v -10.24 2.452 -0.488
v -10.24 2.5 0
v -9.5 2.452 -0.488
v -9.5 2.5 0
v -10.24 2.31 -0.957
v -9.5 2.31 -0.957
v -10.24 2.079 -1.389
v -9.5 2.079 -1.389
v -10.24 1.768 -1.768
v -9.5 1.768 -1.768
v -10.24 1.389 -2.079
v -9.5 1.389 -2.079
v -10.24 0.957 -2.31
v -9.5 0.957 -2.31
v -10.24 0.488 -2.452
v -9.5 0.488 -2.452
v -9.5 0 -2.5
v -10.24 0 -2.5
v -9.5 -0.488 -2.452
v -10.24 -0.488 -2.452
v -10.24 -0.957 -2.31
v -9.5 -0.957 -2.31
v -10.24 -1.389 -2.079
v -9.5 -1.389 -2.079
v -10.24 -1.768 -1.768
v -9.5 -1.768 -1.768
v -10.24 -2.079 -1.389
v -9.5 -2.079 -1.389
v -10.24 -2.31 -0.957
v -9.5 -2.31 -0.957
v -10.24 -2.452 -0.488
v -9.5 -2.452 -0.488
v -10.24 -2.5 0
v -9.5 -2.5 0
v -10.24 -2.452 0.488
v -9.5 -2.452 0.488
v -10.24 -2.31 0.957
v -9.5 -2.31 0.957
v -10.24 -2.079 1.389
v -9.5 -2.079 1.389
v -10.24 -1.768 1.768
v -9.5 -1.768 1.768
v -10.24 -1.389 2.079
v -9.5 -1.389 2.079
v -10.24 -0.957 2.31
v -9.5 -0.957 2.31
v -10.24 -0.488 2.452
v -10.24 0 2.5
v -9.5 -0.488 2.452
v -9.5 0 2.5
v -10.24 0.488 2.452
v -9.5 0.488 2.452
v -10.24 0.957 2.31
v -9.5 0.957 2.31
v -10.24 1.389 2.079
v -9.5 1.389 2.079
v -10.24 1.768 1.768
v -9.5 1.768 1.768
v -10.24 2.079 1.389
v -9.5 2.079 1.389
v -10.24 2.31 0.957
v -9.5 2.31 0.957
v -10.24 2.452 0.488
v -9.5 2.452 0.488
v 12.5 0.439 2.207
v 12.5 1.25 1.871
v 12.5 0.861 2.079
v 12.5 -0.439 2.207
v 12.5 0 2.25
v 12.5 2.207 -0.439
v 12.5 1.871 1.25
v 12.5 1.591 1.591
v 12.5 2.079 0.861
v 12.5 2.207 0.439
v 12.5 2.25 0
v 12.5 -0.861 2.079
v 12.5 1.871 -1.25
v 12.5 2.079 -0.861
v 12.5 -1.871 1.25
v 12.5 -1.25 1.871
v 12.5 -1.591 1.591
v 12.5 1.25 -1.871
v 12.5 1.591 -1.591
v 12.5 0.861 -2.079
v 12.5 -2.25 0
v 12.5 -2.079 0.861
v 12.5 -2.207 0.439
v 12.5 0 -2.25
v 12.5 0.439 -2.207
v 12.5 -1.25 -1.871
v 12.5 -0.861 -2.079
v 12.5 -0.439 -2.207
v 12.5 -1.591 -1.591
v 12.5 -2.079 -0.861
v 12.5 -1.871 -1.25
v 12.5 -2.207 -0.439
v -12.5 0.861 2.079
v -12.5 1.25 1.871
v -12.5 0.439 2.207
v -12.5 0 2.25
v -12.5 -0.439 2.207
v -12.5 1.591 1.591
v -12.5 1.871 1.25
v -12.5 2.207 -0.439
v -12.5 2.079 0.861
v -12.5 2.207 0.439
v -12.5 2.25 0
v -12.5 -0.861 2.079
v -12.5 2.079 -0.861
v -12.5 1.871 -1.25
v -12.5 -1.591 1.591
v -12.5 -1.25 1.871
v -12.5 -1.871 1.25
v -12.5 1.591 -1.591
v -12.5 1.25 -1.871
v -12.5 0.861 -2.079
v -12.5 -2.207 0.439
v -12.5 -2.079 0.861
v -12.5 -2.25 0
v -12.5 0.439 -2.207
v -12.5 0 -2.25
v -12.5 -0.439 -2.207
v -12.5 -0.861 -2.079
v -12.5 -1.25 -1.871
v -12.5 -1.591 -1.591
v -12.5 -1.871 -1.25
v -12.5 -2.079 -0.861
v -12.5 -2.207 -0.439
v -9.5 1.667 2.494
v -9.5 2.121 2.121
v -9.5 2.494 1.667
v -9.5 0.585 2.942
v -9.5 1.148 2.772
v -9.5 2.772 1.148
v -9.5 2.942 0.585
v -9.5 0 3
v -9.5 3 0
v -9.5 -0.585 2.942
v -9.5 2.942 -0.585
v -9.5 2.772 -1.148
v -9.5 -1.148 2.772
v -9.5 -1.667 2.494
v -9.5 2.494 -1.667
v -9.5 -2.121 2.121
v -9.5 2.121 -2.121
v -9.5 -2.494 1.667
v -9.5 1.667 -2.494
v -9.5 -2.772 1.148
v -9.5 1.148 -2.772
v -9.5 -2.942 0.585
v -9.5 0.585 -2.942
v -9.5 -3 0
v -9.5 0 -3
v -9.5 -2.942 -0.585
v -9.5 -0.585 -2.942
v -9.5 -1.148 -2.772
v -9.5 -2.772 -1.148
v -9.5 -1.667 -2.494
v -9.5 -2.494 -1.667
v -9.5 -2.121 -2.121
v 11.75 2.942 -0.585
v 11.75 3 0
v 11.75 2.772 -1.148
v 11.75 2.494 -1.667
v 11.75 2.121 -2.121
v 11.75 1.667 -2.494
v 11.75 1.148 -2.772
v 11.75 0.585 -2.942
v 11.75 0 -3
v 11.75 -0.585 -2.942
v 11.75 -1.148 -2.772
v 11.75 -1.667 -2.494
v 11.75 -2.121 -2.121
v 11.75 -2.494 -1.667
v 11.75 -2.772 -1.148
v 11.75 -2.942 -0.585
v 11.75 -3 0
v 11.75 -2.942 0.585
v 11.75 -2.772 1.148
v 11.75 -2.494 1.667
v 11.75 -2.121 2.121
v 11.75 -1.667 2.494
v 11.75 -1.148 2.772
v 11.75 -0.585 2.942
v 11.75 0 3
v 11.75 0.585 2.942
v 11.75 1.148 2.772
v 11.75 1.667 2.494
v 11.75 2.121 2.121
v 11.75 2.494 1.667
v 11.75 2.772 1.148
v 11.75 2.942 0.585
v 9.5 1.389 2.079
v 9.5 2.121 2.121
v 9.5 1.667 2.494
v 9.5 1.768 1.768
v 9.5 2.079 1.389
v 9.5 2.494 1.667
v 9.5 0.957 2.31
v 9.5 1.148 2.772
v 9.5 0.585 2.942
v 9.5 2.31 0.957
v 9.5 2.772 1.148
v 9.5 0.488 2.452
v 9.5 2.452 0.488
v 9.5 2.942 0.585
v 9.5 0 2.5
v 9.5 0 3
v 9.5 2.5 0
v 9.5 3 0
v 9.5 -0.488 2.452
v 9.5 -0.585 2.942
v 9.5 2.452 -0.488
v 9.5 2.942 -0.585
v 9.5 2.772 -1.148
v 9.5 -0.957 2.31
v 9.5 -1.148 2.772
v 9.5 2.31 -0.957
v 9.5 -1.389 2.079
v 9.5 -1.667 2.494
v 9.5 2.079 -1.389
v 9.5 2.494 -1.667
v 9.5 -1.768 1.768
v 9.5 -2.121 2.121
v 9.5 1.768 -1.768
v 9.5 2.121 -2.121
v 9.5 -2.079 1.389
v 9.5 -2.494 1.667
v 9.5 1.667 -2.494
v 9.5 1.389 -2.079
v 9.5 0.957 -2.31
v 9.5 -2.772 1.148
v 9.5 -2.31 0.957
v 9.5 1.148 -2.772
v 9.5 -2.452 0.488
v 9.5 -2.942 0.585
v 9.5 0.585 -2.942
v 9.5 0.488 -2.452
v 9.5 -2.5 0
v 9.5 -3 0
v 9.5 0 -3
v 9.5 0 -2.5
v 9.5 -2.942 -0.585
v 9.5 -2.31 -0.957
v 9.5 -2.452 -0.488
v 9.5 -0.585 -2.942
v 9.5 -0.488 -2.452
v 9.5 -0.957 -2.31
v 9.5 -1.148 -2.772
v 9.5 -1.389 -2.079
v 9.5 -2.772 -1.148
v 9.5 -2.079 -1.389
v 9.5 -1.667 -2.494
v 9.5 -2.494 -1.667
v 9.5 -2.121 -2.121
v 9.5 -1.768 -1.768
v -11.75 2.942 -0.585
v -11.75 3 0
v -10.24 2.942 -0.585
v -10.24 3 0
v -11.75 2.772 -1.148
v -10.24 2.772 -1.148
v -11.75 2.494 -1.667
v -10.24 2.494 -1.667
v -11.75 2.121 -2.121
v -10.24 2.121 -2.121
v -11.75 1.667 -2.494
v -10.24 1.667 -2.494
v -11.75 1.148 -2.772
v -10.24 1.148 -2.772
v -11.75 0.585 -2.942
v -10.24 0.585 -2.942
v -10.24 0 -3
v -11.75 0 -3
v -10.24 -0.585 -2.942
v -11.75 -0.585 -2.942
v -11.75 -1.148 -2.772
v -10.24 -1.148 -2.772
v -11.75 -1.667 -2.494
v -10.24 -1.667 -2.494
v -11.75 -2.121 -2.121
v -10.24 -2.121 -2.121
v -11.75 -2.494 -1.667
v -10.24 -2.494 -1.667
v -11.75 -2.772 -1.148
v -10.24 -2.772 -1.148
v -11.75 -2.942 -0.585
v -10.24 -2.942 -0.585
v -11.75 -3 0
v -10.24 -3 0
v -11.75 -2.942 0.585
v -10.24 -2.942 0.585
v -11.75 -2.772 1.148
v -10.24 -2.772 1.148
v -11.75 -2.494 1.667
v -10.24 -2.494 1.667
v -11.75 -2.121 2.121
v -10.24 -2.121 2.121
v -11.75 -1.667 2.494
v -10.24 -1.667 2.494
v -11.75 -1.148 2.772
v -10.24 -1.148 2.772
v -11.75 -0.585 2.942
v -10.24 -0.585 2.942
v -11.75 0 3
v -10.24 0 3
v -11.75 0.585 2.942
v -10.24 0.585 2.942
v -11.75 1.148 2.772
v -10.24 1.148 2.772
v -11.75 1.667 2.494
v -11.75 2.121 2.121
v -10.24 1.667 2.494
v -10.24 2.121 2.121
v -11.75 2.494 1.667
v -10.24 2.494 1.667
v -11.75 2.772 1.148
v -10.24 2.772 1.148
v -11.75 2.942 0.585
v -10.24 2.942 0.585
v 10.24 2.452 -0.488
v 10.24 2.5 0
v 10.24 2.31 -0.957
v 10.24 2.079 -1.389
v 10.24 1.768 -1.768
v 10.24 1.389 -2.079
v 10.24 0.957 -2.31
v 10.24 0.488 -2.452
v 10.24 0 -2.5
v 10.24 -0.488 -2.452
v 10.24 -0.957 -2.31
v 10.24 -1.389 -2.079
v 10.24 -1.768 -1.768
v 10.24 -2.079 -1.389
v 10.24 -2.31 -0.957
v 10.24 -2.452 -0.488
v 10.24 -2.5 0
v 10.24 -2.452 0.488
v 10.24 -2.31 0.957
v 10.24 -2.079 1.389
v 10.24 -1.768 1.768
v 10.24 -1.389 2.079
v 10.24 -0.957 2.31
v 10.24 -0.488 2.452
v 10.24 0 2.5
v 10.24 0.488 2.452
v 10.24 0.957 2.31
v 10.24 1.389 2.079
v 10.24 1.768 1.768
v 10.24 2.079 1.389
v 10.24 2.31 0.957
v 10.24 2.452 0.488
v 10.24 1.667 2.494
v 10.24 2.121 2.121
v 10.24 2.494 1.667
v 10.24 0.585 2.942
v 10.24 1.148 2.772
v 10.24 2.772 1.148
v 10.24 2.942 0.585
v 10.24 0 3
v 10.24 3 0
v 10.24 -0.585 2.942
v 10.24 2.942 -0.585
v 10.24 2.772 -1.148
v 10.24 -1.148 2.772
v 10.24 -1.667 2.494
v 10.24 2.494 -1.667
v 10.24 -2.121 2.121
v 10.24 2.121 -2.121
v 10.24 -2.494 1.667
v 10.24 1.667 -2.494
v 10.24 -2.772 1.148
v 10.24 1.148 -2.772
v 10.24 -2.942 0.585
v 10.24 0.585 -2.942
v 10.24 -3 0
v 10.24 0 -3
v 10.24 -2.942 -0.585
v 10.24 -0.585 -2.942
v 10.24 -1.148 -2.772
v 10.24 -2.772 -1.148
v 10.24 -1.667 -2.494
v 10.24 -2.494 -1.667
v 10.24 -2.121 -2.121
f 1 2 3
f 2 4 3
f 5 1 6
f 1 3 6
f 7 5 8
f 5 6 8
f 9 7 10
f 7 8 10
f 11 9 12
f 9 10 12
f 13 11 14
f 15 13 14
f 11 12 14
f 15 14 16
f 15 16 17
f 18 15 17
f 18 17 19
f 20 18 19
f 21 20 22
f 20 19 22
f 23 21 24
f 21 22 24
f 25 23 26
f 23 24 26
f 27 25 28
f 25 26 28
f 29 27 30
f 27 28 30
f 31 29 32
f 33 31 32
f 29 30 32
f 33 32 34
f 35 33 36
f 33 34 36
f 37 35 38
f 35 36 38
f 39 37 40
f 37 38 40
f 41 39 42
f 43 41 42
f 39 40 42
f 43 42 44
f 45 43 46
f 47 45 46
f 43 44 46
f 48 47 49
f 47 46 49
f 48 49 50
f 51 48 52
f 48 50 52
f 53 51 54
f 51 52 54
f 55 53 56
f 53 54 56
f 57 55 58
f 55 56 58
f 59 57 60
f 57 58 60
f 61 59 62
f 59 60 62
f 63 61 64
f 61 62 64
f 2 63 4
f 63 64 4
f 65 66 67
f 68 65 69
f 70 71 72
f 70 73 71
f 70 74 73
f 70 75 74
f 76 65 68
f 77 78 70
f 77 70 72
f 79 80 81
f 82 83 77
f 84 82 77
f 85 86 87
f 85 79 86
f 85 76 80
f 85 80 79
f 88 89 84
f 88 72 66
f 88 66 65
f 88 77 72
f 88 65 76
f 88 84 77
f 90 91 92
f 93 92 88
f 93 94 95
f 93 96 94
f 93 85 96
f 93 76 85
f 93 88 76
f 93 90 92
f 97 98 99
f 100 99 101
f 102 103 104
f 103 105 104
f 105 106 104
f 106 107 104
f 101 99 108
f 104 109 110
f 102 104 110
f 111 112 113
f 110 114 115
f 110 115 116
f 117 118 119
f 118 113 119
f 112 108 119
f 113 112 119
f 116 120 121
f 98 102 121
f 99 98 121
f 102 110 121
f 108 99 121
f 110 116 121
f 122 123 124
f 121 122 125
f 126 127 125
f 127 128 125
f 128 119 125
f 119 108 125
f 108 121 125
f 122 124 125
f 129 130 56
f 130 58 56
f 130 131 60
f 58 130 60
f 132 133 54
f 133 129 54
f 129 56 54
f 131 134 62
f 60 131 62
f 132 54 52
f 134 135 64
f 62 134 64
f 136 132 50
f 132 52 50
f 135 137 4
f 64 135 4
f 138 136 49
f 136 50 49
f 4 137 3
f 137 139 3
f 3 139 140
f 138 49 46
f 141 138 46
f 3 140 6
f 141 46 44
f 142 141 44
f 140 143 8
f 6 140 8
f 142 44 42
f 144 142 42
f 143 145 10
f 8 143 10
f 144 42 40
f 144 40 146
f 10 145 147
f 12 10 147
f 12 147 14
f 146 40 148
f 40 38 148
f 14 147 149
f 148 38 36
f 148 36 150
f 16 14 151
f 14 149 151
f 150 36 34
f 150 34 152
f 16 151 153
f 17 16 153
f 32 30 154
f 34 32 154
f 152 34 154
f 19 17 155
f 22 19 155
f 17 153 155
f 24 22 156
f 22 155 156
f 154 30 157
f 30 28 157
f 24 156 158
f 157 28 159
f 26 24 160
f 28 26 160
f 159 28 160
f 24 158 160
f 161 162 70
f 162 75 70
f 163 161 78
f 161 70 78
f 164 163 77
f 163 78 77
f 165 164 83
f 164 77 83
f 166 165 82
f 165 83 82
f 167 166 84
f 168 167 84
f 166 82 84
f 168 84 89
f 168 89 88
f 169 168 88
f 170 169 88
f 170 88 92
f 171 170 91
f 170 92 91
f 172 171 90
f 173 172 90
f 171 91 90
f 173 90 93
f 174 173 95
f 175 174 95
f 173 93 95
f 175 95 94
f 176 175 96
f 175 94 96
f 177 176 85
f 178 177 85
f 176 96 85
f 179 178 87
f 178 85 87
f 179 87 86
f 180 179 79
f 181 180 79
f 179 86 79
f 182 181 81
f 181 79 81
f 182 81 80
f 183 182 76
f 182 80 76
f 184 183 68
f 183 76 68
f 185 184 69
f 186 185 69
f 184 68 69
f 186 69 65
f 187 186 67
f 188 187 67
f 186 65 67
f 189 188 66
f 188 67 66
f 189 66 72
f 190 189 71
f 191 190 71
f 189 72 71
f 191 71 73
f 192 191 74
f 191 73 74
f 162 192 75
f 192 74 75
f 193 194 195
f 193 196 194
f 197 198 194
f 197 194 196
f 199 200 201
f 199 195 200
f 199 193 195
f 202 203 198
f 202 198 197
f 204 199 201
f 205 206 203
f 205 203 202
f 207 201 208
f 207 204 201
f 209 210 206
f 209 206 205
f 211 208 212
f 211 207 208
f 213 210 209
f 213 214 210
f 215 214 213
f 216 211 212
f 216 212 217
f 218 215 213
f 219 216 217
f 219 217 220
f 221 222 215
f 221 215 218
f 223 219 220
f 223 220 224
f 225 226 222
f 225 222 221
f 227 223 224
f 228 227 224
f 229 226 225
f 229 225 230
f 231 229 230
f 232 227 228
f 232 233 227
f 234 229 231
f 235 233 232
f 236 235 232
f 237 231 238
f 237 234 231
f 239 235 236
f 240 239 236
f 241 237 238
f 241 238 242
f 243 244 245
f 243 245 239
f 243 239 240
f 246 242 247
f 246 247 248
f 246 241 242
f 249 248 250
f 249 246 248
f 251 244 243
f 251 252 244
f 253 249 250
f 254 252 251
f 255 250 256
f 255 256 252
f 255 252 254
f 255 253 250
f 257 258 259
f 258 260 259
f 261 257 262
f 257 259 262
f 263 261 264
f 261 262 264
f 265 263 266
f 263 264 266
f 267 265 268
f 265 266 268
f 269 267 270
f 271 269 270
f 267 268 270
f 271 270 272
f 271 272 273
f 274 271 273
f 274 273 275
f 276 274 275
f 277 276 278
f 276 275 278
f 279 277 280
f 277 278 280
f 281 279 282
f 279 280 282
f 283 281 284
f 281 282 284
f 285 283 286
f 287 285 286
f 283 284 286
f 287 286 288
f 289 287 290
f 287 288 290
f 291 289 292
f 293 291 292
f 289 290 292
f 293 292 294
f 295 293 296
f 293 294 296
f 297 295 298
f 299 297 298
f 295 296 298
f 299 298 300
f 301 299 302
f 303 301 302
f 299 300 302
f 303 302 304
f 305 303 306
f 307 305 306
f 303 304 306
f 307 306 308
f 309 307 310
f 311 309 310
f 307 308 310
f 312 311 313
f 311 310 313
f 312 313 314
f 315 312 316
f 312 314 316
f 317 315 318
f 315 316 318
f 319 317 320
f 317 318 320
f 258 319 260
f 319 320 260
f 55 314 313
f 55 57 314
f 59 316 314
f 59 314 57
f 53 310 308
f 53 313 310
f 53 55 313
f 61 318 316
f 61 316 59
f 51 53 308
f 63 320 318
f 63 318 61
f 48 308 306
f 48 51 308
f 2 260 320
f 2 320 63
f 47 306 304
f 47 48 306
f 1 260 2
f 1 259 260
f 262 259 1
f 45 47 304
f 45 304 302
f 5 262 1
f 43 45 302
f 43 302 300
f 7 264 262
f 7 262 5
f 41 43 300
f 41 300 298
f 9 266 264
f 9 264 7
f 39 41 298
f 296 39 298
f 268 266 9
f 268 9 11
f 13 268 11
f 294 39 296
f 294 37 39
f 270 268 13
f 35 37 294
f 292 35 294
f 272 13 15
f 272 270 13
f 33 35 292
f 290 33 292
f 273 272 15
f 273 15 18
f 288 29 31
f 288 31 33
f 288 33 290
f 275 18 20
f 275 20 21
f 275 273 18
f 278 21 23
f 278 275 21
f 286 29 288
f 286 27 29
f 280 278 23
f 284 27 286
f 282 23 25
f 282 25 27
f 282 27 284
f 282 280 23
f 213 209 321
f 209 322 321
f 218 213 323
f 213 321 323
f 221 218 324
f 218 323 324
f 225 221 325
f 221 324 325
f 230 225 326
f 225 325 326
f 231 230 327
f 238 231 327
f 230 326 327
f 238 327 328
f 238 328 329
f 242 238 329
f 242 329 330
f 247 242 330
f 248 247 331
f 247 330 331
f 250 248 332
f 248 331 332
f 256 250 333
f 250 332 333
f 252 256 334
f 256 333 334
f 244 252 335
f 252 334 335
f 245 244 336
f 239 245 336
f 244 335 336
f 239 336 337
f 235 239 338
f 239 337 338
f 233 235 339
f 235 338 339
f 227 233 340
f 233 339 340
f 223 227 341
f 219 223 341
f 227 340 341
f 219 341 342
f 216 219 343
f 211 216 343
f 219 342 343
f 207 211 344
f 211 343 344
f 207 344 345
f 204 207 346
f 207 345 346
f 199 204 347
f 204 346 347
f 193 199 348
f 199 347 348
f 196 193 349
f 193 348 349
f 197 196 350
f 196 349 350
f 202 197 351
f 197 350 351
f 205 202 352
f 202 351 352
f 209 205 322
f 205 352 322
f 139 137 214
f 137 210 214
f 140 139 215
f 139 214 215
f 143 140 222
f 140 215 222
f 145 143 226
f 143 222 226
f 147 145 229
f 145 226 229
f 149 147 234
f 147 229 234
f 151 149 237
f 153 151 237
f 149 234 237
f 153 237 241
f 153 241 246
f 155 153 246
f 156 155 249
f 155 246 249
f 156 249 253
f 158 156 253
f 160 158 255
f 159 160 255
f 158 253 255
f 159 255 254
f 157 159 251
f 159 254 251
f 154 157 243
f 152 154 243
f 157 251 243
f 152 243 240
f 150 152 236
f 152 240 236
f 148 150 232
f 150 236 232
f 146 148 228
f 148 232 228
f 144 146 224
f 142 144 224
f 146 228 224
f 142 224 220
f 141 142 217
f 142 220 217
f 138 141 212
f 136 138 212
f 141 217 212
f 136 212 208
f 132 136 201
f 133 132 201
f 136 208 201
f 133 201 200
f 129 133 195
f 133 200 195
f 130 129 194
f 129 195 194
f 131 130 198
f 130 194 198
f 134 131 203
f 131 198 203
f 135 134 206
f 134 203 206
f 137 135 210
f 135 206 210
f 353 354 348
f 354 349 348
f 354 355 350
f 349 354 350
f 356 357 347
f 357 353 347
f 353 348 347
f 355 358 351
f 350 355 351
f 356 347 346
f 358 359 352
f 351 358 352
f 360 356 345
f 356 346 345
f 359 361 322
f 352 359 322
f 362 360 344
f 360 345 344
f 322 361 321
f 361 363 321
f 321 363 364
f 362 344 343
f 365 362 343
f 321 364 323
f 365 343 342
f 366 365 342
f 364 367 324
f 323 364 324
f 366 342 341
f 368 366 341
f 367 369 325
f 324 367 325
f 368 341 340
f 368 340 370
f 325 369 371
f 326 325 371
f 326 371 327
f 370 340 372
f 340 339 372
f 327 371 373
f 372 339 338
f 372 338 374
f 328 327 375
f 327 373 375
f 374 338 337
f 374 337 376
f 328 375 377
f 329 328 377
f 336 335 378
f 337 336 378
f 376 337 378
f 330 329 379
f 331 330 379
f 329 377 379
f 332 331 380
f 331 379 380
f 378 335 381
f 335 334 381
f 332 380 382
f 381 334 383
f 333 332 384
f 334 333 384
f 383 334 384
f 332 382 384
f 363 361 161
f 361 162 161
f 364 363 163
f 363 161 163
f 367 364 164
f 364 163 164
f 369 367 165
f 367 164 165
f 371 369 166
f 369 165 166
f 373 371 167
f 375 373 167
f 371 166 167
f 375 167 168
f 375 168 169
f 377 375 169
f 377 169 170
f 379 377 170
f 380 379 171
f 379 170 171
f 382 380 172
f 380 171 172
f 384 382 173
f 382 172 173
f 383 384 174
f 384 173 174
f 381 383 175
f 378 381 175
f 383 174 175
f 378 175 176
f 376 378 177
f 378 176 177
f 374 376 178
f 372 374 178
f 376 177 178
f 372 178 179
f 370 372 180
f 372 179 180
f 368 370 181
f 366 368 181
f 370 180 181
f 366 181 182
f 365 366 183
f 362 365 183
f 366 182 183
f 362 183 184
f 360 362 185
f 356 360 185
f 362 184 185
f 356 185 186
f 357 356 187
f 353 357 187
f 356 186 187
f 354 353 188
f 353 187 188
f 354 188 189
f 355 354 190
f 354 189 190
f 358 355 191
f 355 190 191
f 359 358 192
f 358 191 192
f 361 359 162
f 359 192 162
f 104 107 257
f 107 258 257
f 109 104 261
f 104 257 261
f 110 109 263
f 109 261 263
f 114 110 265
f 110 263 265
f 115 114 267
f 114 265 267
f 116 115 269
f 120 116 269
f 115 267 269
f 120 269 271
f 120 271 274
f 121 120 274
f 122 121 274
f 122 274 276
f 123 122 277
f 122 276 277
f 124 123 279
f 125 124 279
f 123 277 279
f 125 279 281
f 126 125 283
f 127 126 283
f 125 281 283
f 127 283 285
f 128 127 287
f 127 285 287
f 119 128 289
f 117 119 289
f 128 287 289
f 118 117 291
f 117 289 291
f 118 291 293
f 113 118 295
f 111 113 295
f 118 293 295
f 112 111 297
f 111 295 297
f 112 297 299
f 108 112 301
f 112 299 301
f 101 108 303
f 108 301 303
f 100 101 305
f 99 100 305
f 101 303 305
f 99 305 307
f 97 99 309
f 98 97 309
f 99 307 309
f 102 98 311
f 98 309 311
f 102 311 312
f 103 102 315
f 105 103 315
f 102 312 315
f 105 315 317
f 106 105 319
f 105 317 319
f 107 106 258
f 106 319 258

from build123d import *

# Parameters (mm, degrees)
SKETCH1_W = 25
SKETCH1_H = 3
SKETCH4_W = 0.74
SKETCH4_H = 0.5
SKETCH5_W = 0.74
SKETCH5_H = 0.5


with BuildPart() as part:
    # Sketch1 → Revolve1 (revolve)
    with BuildSketch(Plane.XY):
        with Locations((0, 1.5)):
            Rectangle(SKETCH1_W, SKETCH1_H)
    revolve(axis=Axis((12.5, 0, 0), (-1, 0, 0)))

    # Sketch2 → Cut-Revolve1 (revolve, cut)
    with BuildSketch(Plane.XY):
        Polygon((11.75, 3), (12.5, 2.25), (12.5, 3), align=None)
    revolve(axis=Axis((12.5, 0, 0), (-1, 0, 0)), mode=Mode.SUBTRACT)

    # Sketch3 → Cut-Revolve2 (revolve, cut)
    with BuildSketch(Plane.XY):
        Polygon((-12.5, 2.25), (-11.75, 3), (-12.5, 3), align=None)
    revolve(axis=Axis((12.5, 0, 0), (-1, 0, 0)), mode=Mode.SUBTRACT)

    # Sketch4 → Cut-Revolve3 (revolve, cut)
    with BuildSketch(Plane.XY):
        with Locations((9.87, 2.75)):
            Rectangle(SKETCH4_W, SKETCH4_H)
    revolve(axis=Axis((12.5, 0, 0), (-1, 0, 0)), mode=Mode.SUBTRACT)

    # Sketch5 → Cut-Revolve4 (revolve, cut)
    with BuildSketch(Plane.XY):
        with Locations((-9.87, 2.75)):
            Rectangle(SKETCH5_W, SKETCH5_H)
    revolve(axis=Axis((12.5, 0, 0), (-1, 0, 0)), mode=Mode.SUBTRACT)


solid = part.part
